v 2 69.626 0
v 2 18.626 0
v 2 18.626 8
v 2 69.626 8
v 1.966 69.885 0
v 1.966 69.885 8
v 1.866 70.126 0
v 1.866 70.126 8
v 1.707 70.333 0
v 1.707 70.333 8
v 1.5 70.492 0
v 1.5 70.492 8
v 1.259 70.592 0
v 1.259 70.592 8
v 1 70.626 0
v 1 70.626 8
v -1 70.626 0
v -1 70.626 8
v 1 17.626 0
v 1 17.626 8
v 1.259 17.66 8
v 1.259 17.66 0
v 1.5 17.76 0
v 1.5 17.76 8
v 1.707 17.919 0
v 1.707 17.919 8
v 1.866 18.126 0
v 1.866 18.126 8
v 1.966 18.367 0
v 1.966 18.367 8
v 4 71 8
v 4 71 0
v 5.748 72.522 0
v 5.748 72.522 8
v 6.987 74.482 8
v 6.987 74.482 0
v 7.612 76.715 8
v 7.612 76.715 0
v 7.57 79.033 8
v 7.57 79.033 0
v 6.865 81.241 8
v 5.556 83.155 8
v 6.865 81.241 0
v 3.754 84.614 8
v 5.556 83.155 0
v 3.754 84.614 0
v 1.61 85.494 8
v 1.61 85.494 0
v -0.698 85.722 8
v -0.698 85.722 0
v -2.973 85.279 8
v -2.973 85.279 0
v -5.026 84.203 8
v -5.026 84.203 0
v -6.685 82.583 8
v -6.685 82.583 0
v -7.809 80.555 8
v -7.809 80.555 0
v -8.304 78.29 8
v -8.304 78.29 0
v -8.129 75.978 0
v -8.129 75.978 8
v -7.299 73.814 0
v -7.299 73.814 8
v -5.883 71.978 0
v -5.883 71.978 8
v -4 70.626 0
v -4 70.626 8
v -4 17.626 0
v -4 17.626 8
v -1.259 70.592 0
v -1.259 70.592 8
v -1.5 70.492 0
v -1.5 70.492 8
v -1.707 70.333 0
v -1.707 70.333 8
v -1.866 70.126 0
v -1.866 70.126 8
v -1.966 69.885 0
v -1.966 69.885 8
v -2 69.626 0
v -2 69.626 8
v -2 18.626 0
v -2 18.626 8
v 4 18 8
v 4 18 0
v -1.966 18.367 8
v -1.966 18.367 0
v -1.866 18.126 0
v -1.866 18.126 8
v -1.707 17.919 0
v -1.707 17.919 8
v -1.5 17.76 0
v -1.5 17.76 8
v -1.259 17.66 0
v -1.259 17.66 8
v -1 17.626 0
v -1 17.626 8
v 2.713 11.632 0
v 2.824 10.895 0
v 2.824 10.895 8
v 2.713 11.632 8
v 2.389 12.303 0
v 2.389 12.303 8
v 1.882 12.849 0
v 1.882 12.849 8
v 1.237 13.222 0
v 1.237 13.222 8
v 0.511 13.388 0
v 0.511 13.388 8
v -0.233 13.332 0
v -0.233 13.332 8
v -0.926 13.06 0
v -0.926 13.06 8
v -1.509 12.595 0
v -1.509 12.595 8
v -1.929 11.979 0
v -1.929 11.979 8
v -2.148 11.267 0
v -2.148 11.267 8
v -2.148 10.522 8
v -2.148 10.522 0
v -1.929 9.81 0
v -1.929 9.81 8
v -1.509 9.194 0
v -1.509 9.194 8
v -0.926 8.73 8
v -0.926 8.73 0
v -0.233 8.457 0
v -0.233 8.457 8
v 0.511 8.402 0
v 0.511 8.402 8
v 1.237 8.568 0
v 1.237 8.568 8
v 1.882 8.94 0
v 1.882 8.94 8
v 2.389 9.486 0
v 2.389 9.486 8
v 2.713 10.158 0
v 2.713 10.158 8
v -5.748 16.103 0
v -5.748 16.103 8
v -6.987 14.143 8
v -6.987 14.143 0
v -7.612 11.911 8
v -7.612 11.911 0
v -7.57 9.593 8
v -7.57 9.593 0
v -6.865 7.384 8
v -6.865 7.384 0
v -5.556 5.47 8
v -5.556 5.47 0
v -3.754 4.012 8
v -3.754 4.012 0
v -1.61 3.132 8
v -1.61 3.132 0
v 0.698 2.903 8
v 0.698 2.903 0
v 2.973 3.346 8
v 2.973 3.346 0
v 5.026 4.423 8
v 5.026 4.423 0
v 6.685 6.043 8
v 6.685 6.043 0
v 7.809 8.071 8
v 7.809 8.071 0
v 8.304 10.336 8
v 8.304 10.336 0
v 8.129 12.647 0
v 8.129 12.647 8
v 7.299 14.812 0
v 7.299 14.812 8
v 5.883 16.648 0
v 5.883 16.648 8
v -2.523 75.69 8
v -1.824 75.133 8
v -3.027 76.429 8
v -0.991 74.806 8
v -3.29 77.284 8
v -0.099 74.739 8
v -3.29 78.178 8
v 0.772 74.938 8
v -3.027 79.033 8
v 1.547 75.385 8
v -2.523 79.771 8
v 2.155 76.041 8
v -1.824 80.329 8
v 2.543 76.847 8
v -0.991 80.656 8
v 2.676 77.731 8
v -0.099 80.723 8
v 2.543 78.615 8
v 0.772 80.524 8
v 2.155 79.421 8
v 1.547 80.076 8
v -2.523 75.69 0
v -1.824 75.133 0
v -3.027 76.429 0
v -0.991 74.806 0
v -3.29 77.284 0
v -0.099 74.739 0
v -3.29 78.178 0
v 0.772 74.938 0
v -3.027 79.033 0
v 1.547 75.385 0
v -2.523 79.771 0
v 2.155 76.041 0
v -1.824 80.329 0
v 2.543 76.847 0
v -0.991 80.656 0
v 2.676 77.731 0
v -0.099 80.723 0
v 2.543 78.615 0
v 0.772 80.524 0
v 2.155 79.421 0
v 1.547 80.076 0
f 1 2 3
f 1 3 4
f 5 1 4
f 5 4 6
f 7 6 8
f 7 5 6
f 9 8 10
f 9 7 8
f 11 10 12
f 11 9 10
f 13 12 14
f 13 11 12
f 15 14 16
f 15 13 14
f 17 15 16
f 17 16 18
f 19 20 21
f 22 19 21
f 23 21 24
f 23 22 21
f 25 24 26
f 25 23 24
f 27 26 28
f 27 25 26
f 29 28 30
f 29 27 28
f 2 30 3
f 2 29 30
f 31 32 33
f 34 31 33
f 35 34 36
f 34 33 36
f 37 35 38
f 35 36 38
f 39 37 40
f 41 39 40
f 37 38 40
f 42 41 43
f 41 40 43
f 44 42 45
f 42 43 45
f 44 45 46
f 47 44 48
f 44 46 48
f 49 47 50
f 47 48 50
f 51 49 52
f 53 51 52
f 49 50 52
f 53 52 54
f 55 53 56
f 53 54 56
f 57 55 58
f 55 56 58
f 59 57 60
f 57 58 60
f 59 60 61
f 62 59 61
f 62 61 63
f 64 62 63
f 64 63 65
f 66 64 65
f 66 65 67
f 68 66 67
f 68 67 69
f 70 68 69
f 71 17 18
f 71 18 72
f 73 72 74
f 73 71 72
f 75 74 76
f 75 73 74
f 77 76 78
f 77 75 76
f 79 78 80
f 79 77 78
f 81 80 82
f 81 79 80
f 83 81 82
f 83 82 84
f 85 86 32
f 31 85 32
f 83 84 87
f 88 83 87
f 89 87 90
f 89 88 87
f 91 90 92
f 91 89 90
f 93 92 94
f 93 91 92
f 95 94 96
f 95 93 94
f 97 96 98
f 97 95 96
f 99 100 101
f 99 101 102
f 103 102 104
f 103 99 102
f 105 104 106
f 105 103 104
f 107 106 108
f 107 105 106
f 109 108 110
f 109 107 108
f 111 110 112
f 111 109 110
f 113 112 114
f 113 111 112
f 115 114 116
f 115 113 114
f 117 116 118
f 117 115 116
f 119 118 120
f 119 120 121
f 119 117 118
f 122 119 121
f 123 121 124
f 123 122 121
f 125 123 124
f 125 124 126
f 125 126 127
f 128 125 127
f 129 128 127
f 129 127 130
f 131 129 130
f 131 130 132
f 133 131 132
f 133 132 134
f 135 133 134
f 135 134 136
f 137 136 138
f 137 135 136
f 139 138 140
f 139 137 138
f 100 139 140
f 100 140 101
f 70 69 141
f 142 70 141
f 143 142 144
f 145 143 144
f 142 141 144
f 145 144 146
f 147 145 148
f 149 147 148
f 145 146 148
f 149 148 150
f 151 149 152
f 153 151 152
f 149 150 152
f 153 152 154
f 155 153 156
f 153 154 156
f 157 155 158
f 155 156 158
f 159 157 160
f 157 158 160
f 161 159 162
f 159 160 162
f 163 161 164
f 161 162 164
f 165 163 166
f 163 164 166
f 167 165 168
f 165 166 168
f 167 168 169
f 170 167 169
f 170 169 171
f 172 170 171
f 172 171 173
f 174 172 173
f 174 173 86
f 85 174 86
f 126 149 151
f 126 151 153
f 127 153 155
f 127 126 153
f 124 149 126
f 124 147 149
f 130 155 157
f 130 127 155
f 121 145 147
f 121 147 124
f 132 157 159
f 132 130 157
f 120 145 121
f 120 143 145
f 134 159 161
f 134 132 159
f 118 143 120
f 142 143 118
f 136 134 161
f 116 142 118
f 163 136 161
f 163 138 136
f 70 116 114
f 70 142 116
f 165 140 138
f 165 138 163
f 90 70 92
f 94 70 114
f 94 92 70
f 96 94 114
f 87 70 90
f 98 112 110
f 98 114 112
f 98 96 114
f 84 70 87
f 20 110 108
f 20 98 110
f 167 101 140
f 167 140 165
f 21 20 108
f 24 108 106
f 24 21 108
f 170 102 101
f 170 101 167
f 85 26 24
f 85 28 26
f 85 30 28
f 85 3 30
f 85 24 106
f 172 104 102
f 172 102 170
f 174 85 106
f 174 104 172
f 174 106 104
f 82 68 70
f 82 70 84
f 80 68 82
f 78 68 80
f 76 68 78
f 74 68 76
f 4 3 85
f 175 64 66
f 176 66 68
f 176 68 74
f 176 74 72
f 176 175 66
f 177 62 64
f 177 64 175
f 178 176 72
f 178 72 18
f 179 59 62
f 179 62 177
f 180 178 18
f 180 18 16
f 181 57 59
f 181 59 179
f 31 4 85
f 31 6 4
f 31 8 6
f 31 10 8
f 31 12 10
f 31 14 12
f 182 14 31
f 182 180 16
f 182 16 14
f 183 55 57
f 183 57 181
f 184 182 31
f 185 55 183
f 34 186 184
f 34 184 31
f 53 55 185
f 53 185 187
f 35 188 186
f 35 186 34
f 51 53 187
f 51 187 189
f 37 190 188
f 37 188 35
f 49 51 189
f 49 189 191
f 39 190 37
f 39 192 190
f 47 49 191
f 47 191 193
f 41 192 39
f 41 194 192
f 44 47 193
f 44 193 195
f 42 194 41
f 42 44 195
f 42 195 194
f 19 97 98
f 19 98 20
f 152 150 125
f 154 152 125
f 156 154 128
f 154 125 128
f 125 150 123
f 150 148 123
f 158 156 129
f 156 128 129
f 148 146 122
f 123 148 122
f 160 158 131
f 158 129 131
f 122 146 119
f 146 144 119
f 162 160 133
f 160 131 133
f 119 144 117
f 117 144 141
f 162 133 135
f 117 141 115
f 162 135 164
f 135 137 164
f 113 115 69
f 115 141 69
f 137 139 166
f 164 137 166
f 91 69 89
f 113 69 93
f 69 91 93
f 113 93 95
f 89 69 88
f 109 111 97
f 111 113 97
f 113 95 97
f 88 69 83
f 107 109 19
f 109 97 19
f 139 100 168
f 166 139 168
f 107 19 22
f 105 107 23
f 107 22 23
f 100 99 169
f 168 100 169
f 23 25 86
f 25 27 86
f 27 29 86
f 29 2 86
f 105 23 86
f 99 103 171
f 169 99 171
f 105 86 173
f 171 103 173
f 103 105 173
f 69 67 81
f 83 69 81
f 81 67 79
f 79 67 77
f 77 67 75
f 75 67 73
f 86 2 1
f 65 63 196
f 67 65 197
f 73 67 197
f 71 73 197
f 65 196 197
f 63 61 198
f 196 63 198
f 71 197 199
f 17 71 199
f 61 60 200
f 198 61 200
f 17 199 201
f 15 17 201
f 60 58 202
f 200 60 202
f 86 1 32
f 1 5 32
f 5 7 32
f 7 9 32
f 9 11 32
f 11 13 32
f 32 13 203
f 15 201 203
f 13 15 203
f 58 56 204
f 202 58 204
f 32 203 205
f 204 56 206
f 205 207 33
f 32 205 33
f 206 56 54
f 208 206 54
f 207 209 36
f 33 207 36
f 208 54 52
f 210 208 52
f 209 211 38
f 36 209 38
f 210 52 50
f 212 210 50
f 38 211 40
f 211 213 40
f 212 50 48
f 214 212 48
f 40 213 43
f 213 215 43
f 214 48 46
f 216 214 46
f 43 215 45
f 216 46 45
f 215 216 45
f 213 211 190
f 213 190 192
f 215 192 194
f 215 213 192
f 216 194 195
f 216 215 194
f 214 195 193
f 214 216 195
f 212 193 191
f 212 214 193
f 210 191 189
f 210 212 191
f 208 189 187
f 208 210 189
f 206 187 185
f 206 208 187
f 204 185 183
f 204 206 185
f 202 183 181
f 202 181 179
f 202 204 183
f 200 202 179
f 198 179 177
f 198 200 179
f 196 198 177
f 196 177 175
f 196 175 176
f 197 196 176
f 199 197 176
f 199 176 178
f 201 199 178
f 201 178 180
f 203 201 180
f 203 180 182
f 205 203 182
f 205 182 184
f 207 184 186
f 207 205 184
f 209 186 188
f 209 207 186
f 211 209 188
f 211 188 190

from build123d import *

# Parameters (mm, degrees)
SKETCH1_R           = 3
SKETCH1_R_2         = 2.5
BOSS_EXTRUDE1_DEPTH = 8


with BuildPart() as part:
    # Sketch1 → Boss-Extrude1 (new body)
    with BuildSketch(Plane.XY):
        with BuildLine():
            Line((4, 18), (4, 71))
            ThreePointArc((4, 71), (-0.697580374, 85.722212416), (-4, 70.625695453))
            Line((-4, 70.625695453), (-4, 17.625695453))
            ThreePointArc((-4, 17.625695453), (0.697580374, 2.903483037), (4, 18))
        make_face()
        with Locations((-0.323684855, 77.730954559)):
            Circle(SKETCH1_R, mode=Mode.SUBTRACT)
        with Locations((0.323684855, 10.894740894)):
            Circle(SKETCH1_R_2, mode=Mode.SUBTRACT)
        with BuildLine():
            Line((-2, 69.625695453), (-2, 18.625695453))
            ThreePointArc((-2, 18.625695453), (-1.707106781, 17.918588672), (-1, 17.625695453))
            Line((-1, 17.625695453), (1, 17.625695453))
            ThreePointArc((1, 17.625695453), (1.707106781, 17.918588672), (2, 18.625695453))
            Line((2, 18.625695453), (2, 69.625695453))
            ThreePointArc((2, 69.625695453), (1.707106781, 70.332802234), (1, 70.625695453))
            Line((1, 70.625695453), (-1, 70.625695453))
            ThreePointArc((-1, 70.625695453), (-1.707106781, 70.332802234), (-2, 69.625695453))
        make_face(mode=Mode.SUBTRACT)
    extrude(amount=BOSS_EXTRUDE1_DEPTH)


solid = part.part
